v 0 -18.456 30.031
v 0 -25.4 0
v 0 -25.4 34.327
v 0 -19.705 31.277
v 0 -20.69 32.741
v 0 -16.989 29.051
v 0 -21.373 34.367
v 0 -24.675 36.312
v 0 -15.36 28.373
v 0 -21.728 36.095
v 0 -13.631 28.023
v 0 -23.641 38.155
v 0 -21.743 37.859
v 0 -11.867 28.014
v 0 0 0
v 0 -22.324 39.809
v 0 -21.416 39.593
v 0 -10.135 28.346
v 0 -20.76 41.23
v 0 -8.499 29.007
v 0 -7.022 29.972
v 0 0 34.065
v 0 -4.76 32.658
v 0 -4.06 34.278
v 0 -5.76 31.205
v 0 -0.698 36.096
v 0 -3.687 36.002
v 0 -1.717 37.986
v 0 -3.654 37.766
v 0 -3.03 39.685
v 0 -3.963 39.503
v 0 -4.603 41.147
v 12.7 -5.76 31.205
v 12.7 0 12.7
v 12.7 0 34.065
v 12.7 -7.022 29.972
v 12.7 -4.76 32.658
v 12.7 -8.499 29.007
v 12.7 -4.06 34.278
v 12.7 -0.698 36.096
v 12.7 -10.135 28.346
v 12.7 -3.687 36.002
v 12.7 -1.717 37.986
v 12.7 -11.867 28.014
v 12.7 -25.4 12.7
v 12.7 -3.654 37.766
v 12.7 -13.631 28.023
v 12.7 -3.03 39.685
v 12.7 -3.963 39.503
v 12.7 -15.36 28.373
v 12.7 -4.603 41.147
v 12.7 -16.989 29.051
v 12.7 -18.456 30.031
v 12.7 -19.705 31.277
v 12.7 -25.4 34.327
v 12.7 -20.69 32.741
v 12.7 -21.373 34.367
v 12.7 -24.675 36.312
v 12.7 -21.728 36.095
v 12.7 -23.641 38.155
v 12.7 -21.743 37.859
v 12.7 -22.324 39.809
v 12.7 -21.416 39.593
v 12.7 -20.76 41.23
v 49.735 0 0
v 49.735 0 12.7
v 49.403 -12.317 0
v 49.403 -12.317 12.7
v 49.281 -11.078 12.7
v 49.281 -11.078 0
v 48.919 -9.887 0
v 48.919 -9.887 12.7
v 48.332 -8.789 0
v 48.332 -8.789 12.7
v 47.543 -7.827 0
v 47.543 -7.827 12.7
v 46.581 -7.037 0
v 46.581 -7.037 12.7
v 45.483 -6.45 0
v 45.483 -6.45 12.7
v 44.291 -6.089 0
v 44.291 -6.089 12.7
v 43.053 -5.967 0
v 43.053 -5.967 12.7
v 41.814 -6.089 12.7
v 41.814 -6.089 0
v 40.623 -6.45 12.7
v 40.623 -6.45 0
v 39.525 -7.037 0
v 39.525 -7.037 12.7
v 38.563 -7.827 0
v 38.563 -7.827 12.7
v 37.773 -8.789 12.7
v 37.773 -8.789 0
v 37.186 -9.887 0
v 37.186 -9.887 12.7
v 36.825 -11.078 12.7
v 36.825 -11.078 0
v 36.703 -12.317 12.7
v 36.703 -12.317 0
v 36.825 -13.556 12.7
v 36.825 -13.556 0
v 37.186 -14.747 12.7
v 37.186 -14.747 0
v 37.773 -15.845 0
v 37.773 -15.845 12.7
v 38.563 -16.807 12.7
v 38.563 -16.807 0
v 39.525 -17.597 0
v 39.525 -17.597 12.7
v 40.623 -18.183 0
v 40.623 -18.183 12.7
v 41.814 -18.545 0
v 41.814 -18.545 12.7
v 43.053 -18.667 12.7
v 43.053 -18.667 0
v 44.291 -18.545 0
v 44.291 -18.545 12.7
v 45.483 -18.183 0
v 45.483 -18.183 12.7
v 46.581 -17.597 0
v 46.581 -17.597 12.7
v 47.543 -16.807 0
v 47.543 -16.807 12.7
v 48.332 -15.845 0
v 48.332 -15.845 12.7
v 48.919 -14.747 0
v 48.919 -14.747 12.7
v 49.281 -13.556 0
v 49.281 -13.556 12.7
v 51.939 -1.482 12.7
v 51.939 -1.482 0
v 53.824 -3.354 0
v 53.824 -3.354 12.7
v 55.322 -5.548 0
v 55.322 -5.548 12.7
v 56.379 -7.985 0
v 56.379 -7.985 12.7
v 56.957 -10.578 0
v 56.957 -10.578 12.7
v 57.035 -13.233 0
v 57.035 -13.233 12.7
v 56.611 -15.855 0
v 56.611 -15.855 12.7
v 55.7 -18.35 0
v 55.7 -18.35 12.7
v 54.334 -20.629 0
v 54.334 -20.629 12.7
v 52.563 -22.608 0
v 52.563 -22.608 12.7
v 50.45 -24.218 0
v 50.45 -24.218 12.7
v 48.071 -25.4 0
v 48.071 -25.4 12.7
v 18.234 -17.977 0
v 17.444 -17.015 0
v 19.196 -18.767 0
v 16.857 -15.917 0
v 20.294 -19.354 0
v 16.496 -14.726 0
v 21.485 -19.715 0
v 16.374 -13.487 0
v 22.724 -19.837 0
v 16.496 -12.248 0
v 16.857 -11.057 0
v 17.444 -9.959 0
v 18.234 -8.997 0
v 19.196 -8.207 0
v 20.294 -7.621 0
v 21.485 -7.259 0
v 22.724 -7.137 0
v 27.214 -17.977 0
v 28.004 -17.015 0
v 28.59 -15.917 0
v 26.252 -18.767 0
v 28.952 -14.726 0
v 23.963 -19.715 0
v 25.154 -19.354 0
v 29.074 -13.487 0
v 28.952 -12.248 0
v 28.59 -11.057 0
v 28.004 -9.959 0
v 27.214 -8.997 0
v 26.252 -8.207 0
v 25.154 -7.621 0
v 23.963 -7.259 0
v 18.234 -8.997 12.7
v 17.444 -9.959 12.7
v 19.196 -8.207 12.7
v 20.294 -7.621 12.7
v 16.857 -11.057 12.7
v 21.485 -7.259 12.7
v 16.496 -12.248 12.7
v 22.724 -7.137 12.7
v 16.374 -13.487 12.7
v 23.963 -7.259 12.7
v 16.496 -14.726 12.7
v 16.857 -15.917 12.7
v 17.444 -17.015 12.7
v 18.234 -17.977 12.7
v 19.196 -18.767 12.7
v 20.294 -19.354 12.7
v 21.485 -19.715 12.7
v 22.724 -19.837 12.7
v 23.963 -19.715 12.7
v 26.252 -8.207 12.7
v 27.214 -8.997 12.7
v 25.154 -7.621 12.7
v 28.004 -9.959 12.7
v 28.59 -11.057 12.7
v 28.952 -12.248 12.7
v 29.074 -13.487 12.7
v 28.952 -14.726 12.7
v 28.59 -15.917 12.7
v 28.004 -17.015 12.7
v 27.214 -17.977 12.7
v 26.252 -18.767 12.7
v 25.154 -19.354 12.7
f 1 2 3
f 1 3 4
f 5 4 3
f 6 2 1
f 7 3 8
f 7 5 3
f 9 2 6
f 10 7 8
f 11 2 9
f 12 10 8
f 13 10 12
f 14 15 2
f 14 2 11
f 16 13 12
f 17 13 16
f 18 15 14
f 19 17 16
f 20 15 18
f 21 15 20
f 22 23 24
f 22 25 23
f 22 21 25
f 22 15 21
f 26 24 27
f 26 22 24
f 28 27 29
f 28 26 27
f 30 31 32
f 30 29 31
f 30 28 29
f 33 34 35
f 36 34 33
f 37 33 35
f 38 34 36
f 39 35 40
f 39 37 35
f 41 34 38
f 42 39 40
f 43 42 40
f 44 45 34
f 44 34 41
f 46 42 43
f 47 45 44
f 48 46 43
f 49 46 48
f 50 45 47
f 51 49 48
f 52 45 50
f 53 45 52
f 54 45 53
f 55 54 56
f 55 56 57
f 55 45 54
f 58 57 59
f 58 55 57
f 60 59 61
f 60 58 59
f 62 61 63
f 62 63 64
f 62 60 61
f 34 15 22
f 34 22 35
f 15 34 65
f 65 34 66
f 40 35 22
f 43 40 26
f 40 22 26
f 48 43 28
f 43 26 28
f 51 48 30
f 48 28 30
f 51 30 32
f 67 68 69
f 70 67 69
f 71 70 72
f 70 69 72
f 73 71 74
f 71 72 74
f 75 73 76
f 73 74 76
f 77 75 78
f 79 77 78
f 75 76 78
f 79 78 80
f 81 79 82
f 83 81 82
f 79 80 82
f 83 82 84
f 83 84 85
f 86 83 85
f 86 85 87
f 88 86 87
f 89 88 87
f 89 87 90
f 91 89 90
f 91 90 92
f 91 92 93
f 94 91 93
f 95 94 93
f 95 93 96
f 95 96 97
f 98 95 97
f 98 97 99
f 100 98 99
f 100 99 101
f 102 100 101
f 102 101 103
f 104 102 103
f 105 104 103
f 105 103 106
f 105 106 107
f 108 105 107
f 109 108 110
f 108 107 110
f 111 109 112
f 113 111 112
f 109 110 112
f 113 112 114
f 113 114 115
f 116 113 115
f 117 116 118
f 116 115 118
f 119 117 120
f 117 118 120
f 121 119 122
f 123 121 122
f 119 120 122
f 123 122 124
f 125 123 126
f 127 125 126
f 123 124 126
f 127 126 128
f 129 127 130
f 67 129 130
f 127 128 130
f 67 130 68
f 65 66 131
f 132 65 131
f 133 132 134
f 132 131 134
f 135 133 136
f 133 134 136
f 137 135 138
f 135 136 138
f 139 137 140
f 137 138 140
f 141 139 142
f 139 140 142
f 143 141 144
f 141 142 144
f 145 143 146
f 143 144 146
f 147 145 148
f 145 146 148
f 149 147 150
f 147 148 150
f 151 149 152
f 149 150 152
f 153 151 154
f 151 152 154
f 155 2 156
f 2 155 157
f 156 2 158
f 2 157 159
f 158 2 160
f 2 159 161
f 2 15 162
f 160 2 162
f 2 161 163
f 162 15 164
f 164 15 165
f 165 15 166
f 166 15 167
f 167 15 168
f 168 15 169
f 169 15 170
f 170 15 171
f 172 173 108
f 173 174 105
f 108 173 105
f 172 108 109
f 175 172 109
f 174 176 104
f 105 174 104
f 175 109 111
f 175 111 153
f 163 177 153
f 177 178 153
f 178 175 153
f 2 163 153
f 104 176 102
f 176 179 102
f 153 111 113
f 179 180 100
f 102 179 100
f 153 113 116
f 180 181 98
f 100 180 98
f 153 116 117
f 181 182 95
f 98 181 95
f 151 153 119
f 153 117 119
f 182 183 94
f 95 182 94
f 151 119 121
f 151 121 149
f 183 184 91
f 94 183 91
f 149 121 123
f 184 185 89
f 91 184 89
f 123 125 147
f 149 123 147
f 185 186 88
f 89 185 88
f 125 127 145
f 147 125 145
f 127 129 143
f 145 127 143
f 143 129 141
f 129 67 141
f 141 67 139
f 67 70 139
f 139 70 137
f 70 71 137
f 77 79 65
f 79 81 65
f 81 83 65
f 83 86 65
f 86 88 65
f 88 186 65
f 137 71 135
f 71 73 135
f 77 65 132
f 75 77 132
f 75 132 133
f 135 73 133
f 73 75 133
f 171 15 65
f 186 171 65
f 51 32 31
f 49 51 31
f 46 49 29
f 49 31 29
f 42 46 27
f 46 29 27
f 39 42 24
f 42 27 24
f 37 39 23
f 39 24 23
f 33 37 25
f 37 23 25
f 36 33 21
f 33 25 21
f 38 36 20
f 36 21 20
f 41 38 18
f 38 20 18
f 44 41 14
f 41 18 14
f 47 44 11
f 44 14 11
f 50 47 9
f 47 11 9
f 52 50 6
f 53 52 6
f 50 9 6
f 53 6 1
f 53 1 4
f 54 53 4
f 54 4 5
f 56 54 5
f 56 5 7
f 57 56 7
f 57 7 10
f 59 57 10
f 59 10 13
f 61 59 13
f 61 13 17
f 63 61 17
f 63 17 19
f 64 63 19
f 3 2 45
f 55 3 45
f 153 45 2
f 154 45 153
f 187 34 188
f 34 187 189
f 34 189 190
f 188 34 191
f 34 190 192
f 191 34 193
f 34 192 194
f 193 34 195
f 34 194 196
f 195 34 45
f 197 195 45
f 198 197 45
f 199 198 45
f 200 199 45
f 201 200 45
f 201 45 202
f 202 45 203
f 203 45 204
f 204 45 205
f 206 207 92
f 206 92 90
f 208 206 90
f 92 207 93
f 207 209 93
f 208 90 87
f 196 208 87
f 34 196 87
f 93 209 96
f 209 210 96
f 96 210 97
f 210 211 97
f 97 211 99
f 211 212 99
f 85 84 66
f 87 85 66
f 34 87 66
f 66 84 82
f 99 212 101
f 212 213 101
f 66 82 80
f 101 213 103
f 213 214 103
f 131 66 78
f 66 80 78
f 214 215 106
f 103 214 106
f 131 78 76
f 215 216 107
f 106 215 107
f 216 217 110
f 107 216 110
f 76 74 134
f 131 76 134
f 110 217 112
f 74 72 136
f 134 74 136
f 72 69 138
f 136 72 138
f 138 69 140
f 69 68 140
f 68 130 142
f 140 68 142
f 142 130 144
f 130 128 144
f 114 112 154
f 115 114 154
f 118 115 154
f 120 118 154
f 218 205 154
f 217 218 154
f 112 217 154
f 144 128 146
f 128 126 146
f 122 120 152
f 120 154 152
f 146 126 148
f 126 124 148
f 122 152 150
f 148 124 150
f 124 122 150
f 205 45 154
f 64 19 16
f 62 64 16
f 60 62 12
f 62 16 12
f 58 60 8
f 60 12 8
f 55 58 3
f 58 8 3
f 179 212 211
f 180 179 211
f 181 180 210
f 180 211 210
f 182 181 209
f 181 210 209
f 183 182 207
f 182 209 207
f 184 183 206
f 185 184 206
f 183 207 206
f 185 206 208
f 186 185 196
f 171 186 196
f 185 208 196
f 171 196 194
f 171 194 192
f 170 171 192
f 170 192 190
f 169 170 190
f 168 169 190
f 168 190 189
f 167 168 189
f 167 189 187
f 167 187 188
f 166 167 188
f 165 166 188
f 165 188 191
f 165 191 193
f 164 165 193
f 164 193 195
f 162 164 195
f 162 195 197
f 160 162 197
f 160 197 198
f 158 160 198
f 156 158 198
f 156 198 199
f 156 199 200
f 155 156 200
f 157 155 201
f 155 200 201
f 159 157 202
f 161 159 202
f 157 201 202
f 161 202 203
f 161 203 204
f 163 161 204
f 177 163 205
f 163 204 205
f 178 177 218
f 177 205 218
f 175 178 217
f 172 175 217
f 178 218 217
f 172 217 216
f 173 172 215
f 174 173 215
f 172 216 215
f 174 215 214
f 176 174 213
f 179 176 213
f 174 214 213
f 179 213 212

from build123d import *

# Parameters (mm, degrees)
F0_W      = 57.15
F0_H      = 44.45
F2_DEPTH  = 25.4
F3_W      = 44.45
F3_H      = 31.75
F4_DEPTH  = 25.4
F6_DEPTH  = 25.4
F8_DEPTH  = 25.4
F10_DEPTH = 25.4
F11_R     = 6.35
F12_DEPTH = 25.4


with BuildPart() as f2:
    # F0 (on Front) → F2 (new body)
    with BuildSketch(Plane.XZ):
        with Locations((28.575, 22.225)):
            Rectangle(F0_W, F0_H)
    extrude(amount=F2_DEPTH)

    # F3 (on face) → F4 (cut)
    with BuildSketch(Plane.XZ.offset(25.4)):
        with Locations((34.925, 28.575)):
            Rectangle(F3_W, F3_H)
    extrude(amount=-F4_DEPTH, mode=Mode.SUBTRACT)

    # F5 (on face) → F6 (cut)
    with BuildSketch(Plane(origin=(0, 0, 0), x_dir=(0, -1, 0), z_dir=(-1, 0, 0))):
        with BuildLine():
            ThreePointArc((0, 34.065149012), (12.5994370477, 43.9648535962), (25.4, 34.3266196875))
            Line((25.4, 34.3266196875), (25.4, 44.45))
            Line((25.4, 44.45), (0, 44.45))
            Line((0, 44.45), (0, 34.065149012))
        make_face()
    extrude(amount=-F6_DEPTH, mode=Mode.SUBTRACT)

    # F7 (on face) → F8 (cut)
    with BuildSketch(Plane(origin=(0, 0, 0), x_dir=(0, -1, 0), z_dir=(-1, 0, 0))):
        with BuildLine():
            ThreePointArc((20.7597522167, 41.230371503), (12.6668838252, 43.9653747873), (4.6026757381, 41.1469870045))
            ThreePointArc((4.6026757381, 41.1469870045), (12.7494064505, 27.9752999749), (20.7597522167, 41.230371503))
        make_face()
    extrude(amount=-F8_DEPTH, mode=Mode.SUBTRACT)

    # F9 (on face) → F10 (cut)
    with BuildSketch(Plane.XY.offset(12.7)):
        with BuildLine():
            ThreePointArc((49.7347712517, 0), (57.0352782302, -13.2327718435), (48.0707809329, -25.4))
            Line((48.0707809329, -25.4), (57.15, -25.4))
            Line((57.15, -25.4), (57.15, 0))
            Line((57.15, 0), (49.7347712517, 0))
        make_face()
    extrude(amount=-F10_DEPTH, mode=Mode.SUBTRACT)

    # F11 (on face) → F12 (cut)
    with BuildSketch(Plane.XY.offset(12.7)):
        with Locations((22.7237032021, -13.4871597779)):
            Circle(F11_R)
        with Locations((43.0526448926, -12.3167495402)):
            Circle(F11_R)
    extrude(amount=-F12_DEPTH, mode=Mode.SUBTRACT)


solid = f2.part
